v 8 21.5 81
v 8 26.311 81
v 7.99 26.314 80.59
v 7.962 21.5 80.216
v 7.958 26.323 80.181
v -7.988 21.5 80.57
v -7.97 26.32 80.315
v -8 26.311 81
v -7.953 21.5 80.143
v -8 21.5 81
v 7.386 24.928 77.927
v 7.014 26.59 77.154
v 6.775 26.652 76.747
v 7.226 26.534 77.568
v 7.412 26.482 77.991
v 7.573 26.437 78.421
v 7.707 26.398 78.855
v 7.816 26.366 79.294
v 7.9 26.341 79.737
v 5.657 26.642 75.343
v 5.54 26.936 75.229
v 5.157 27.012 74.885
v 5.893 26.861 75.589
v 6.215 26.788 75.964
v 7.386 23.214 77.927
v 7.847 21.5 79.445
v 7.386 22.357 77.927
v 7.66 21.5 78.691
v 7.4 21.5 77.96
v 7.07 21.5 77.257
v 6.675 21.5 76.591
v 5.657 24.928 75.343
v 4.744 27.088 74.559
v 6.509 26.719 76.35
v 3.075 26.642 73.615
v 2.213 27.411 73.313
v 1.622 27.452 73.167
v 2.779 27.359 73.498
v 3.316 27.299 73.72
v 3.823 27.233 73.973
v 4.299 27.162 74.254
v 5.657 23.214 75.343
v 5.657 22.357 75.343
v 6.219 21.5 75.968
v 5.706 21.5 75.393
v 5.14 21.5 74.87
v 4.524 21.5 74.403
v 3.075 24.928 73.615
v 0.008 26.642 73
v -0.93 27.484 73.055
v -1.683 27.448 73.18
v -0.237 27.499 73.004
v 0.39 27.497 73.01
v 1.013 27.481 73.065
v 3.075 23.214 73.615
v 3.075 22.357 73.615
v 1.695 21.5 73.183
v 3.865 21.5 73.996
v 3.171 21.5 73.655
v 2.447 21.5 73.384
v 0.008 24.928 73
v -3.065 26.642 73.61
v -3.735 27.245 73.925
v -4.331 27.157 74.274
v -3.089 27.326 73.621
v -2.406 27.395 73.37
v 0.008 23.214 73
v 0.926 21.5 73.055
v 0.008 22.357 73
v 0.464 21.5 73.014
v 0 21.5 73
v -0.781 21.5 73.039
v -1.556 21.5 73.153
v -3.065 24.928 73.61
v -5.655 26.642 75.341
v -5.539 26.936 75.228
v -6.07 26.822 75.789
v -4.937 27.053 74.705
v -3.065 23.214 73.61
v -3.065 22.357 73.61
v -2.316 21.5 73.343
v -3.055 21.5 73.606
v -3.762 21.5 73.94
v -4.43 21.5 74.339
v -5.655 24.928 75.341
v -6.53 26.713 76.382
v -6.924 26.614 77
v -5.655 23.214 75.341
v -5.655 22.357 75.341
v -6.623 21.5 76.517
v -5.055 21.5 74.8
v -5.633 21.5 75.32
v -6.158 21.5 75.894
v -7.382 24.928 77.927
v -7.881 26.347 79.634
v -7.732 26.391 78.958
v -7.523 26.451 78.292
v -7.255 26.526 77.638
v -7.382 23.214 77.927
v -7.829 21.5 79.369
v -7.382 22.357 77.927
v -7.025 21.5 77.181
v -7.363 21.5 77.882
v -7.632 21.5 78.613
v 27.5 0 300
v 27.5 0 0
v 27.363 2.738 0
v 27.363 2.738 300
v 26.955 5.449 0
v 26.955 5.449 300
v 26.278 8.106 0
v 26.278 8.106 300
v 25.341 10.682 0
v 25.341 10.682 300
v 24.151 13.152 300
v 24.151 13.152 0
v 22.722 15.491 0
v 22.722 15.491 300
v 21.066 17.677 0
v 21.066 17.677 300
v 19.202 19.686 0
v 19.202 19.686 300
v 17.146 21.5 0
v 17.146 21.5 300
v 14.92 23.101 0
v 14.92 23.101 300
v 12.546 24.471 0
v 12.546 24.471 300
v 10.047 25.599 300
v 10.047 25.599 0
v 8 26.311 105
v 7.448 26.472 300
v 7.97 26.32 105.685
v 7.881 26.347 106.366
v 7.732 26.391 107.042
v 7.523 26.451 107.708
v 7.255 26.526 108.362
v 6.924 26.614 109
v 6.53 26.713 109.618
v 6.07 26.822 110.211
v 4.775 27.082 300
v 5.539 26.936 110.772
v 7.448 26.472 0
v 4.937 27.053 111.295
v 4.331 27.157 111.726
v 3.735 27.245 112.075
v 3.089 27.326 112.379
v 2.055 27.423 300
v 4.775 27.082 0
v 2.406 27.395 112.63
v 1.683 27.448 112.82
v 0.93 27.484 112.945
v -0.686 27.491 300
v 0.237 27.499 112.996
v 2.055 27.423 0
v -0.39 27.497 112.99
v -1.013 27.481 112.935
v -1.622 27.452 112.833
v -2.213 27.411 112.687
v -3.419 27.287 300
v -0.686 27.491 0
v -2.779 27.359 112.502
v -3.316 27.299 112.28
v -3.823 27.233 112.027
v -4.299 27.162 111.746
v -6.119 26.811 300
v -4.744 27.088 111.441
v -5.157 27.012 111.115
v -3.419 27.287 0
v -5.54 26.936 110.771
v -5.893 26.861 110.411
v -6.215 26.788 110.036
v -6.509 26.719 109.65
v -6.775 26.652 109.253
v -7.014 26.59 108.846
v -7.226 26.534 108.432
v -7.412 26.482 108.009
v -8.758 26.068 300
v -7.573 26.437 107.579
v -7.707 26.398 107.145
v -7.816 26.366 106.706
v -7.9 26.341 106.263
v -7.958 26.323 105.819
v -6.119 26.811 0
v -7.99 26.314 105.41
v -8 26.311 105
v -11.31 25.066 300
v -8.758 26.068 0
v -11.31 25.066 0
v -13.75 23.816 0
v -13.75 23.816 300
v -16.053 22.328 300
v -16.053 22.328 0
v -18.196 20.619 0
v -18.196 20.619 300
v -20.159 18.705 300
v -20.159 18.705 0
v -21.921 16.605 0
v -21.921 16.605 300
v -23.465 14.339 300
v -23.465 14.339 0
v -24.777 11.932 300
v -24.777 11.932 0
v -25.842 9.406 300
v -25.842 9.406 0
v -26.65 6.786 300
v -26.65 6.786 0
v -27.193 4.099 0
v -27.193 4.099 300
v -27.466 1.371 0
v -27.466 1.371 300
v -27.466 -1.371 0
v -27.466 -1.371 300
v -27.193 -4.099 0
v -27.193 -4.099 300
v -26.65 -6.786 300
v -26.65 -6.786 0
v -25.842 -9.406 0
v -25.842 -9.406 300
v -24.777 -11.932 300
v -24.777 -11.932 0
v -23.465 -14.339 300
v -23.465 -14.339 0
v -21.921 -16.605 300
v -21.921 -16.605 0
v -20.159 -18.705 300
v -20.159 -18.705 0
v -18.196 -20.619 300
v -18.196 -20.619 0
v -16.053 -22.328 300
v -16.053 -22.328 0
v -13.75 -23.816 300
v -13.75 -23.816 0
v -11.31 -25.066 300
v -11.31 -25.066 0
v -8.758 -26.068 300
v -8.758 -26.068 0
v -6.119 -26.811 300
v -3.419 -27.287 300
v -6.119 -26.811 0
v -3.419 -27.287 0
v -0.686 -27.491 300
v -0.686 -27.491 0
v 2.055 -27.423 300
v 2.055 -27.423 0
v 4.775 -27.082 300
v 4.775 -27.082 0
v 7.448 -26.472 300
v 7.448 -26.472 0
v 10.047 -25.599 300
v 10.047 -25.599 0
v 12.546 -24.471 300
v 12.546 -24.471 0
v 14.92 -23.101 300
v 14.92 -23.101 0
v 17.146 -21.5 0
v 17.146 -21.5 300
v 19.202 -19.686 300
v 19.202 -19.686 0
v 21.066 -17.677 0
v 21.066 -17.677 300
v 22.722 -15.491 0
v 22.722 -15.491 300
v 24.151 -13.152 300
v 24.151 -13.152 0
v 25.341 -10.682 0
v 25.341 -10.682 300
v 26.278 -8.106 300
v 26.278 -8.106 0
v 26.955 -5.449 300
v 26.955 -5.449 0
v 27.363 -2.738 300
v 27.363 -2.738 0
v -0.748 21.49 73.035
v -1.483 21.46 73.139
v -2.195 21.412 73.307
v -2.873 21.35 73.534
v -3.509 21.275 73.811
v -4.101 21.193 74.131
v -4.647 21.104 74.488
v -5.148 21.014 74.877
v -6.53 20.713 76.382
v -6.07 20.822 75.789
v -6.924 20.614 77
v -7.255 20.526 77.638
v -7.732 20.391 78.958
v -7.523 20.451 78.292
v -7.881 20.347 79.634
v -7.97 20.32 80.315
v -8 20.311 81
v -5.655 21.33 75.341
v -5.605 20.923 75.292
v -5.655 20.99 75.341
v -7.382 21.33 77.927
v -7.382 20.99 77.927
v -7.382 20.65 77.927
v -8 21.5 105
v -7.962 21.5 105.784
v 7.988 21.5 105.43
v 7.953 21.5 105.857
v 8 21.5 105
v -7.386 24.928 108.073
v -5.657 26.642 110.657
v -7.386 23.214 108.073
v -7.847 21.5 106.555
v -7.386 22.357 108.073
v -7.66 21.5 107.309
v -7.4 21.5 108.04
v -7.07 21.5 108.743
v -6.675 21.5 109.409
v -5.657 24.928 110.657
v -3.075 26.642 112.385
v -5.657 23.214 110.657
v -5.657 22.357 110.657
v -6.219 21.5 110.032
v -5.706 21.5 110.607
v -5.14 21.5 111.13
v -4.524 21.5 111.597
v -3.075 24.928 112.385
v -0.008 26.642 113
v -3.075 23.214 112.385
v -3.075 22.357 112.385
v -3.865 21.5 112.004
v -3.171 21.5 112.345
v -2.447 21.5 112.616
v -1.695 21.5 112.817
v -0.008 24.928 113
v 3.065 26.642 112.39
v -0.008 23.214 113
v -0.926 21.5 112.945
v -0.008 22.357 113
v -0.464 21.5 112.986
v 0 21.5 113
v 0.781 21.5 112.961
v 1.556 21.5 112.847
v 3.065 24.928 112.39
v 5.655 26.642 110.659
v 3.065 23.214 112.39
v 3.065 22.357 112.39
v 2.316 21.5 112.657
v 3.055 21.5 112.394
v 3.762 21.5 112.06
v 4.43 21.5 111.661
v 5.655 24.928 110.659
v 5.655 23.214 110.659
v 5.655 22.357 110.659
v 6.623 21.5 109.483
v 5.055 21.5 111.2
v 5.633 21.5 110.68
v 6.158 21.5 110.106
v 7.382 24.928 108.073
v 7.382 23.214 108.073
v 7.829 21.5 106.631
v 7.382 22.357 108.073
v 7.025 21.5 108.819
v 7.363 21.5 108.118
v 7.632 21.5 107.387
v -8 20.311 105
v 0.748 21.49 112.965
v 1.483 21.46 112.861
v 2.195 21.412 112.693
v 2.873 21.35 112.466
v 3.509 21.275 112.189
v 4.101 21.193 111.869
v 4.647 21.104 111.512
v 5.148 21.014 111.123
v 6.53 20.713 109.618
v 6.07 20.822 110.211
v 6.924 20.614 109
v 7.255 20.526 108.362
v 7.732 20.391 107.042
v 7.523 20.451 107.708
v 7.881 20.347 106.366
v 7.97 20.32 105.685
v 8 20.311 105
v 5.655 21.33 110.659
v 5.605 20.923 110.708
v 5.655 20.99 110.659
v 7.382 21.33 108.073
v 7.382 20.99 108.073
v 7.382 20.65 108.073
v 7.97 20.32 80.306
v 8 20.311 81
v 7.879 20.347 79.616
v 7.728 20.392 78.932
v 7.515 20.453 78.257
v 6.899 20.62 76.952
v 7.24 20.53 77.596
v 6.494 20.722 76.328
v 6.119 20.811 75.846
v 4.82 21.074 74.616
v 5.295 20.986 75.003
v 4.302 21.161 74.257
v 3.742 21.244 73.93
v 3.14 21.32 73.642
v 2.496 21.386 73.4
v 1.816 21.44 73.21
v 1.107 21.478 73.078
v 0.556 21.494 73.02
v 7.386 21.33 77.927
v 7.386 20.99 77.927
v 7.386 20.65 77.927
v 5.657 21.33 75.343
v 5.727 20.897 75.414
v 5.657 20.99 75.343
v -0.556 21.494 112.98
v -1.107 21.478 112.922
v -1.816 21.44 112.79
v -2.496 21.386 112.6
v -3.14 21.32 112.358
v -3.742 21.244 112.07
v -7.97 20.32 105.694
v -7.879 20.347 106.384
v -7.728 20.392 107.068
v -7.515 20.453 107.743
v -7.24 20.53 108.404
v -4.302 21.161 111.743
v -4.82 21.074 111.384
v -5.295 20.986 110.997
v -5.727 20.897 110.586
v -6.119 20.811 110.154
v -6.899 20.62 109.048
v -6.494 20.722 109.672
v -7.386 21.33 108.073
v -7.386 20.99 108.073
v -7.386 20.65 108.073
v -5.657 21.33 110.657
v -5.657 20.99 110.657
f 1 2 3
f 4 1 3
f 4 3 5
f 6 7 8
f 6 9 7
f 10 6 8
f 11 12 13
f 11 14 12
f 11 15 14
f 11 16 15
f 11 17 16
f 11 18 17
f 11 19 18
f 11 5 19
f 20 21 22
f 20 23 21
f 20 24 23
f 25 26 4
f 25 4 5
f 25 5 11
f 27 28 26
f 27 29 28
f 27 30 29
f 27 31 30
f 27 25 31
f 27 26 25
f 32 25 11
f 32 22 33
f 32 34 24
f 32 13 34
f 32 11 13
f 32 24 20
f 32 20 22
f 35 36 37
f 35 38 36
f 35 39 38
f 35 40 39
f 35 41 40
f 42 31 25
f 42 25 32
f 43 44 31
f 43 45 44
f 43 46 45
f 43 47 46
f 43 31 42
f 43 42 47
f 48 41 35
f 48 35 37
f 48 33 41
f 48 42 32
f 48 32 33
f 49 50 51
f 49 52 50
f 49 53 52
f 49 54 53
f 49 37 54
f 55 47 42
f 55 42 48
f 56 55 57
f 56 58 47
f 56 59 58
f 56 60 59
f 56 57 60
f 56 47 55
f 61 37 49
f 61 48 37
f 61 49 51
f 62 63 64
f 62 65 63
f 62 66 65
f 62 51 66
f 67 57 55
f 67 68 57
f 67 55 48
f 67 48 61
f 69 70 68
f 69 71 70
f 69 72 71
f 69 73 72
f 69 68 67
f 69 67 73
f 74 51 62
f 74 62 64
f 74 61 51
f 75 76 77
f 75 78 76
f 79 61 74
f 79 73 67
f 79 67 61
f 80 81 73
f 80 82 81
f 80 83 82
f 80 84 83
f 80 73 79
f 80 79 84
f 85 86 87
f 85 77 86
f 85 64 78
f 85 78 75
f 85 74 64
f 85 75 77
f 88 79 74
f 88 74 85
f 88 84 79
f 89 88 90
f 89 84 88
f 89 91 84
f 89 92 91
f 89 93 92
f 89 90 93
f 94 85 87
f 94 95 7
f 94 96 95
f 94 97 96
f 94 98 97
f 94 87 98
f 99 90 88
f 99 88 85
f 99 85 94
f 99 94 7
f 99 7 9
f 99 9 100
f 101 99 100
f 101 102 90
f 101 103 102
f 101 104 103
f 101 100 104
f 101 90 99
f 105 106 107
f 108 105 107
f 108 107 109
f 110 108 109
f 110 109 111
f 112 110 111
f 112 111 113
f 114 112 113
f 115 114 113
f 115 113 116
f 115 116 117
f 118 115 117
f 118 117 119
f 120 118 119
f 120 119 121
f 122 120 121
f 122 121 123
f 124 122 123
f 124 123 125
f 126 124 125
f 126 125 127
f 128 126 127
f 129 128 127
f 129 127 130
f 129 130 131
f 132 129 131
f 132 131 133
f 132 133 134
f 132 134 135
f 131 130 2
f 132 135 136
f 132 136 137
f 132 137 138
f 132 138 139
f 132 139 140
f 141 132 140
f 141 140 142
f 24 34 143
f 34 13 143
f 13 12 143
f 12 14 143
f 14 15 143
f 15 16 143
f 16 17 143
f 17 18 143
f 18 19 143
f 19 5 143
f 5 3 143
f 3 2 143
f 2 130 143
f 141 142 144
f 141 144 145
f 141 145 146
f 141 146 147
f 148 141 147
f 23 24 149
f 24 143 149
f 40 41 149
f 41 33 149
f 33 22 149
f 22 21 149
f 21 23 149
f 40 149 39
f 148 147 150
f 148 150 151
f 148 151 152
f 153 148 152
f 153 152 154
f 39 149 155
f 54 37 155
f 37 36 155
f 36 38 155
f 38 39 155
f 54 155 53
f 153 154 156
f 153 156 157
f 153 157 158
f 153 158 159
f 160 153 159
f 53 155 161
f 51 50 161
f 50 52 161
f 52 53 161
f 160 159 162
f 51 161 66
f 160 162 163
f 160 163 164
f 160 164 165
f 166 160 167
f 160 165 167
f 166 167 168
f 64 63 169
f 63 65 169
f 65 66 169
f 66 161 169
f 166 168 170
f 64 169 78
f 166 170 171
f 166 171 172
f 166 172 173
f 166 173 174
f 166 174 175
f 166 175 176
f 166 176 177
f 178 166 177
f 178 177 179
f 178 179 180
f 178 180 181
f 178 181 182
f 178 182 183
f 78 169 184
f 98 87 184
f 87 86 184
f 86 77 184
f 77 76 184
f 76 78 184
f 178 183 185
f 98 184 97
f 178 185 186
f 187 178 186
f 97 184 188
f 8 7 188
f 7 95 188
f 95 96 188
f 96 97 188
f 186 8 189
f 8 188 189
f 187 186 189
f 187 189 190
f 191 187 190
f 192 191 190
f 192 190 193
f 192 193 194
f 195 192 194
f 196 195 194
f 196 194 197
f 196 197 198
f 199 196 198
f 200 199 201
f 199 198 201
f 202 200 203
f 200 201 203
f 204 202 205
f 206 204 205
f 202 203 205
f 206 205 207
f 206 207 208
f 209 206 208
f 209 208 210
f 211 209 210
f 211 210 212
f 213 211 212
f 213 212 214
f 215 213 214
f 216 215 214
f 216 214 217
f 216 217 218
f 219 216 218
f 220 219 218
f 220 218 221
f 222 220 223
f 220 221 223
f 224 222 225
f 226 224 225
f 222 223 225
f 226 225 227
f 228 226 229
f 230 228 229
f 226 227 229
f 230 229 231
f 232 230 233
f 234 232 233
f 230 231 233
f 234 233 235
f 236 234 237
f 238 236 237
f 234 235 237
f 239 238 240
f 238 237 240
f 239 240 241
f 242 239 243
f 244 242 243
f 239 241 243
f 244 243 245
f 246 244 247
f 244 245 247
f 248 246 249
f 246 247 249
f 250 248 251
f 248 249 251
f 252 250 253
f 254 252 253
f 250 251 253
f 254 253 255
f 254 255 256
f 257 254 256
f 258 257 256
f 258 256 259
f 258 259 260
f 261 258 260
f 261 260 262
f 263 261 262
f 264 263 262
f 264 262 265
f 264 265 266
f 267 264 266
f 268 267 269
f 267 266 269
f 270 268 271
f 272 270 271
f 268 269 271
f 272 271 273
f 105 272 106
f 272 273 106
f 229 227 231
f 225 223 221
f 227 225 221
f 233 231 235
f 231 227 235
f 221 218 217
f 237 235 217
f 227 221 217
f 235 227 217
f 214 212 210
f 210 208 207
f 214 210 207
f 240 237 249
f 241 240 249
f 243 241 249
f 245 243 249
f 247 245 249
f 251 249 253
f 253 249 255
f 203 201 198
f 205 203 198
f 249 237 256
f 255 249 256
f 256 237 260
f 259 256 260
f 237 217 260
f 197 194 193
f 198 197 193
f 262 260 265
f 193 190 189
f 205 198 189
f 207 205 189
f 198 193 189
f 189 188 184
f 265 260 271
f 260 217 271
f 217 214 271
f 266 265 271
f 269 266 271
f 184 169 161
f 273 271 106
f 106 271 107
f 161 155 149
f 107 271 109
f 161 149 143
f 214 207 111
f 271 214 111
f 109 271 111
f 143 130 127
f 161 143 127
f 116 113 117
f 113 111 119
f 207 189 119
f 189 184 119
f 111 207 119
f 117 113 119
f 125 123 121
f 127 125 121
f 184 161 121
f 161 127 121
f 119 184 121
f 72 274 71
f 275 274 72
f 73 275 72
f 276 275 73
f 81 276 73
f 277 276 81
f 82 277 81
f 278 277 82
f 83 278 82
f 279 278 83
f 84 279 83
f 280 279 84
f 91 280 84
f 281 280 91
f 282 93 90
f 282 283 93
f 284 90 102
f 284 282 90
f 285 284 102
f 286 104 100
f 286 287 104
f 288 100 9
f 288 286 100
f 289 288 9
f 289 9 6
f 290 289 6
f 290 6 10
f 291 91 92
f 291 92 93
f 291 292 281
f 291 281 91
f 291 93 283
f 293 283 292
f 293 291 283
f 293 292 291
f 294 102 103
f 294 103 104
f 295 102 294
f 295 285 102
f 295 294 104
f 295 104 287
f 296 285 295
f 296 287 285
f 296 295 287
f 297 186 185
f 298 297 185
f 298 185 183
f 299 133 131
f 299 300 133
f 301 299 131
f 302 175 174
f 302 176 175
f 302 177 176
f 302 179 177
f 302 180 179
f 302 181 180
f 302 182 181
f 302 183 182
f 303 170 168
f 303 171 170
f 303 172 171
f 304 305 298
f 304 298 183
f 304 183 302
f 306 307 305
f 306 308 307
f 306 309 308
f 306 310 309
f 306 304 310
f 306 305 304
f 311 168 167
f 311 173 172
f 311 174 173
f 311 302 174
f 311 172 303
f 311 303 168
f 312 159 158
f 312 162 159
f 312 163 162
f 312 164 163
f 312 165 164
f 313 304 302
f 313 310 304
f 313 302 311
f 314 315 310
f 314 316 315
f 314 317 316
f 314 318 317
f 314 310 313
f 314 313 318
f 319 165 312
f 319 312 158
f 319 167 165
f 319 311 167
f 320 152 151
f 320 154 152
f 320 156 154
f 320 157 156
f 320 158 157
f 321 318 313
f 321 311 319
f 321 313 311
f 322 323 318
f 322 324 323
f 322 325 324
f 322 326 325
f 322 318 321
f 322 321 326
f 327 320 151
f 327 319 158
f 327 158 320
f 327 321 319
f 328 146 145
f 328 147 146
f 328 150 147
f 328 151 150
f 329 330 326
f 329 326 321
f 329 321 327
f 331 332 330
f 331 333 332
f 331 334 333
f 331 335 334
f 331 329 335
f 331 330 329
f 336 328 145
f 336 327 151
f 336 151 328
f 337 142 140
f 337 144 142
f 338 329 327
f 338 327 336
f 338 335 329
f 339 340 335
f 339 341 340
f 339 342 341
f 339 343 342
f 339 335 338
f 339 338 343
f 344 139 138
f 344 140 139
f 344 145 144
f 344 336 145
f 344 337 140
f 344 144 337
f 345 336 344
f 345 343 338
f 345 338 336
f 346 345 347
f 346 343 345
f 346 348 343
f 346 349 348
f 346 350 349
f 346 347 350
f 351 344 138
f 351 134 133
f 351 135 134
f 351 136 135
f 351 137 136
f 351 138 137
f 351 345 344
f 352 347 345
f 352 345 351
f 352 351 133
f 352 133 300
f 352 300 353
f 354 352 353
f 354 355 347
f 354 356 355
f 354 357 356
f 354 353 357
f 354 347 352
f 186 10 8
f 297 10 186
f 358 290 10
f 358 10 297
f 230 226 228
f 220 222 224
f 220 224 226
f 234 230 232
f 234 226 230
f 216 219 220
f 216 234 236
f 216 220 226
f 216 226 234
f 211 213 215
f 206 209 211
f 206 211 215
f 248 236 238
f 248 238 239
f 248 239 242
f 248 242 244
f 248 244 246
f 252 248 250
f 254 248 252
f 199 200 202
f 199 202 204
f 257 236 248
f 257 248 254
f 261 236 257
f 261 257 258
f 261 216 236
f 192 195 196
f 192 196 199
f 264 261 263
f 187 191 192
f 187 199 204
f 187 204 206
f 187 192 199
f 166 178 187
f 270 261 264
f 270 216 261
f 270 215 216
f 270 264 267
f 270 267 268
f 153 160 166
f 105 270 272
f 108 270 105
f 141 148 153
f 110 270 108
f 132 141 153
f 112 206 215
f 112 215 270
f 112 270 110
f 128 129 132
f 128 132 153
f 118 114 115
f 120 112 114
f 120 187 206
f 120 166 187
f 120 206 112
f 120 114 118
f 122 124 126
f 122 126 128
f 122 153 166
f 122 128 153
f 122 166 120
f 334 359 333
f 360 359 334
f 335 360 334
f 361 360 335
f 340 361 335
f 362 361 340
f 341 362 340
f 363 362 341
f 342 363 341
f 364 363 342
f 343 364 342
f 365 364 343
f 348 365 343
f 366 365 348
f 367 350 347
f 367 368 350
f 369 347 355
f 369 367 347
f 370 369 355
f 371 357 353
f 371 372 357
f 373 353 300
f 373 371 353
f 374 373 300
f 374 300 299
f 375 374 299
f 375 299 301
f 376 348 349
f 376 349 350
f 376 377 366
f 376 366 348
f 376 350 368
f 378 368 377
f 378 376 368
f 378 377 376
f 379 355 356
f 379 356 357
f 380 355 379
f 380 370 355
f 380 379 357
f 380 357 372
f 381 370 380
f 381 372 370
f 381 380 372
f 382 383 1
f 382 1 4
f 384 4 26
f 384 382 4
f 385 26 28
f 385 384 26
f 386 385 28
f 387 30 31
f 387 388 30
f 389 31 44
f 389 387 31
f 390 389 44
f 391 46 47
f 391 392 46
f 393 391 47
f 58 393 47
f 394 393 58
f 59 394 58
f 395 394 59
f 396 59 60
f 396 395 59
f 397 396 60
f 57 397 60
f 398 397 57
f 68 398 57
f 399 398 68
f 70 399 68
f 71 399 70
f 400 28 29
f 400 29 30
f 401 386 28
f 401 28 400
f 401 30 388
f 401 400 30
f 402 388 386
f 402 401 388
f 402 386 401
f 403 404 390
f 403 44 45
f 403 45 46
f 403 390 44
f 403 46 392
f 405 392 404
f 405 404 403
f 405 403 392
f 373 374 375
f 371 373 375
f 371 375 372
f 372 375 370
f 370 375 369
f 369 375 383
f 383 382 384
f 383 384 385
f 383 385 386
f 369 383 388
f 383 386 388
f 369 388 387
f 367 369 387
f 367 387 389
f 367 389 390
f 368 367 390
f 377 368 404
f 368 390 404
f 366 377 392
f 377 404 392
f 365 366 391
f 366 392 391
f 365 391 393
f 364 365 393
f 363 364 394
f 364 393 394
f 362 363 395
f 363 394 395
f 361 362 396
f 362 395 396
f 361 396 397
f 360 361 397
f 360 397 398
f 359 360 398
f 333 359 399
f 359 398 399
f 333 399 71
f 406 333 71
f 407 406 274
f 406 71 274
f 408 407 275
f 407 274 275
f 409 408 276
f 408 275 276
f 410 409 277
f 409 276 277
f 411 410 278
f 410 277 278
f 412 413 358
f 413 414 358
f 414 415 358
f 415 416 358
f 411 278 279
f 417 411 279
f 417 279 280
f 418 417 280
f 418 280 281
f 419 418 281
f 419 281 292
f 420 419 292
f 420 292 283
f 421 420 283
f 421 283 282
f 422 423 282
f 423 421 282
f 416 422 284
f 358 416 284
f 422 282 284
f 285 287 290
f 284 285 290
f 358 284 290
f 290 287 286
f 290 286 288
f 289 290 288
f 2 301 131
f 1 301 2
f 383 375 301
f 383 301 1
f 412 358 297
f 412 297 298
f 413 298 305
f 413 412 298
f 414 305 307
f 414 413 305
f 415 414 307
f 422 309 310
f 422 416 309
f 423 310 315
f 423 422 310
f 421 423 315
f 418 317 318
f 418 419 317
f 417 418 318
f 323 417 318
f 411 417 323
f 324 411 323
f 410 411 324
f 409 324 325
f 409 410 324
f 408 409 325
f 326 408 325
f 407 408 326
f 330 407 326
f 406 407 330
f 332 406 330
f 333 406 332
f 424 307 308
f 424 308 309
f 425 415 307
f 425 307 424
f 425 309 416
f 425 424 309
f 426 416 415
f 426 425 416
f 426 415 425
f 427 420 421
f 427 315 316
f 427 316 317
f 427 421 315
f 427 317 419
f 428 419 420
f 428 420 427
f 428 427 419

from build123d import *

# Parameters (mm, degrees)
SKETCH1_R            = 27.5
BOSS_EXTRUDE1_DEPTH  = 300
CUT_EXTRUDE1_START   = 21.500000052
CUT_EXTRUDE1_DEPTH   = 7.499999948
CUT_EXTRUDE1_START_2 = 20.310644134
CUT_EXTRUDE1_2_DEPTH = 1.189355918
CUT_EXTRUDE1_START_3 = 72.999999946
CUT_EXTRUDE1_3_DEPTH = 40.000000108


with BuildPart() as part:
    # Sketch1 → Boss-Extrude1 (new body)
    with BuildSketch(Plane.XY):
        Circle(SKETCH1_R)
    extrude(amount=BOSS_EXTRUDE1_DEPTH)

    # Cut-Extrude1: read off the stored shape, not the designer's step
    # Cut-Extrude1 outline → Cut-Extrude1 (cut)
    with BuildSketch(Plane(origin=(0, 0, 0), x_dir=(1, 0, 0), z_dir=(0, 1, 0)).offset(CUT_EXTRUDE1_START)):
        with BuildLine():
            Line((-8, -81), (-8, -105))
            add(Edge.make_bspline(
                [(-8, -105), (-8, -106.063035006), (-7.788701178, -107.105523906), (-6.984119374, -109.039699683), (-6.390533847, -109.923095258), (-4.923786882, -111.390000979), (-4.036294094, -111.985161837), (-2.113824822, -112.785621396), (-1.057490709, -112.998980405), (1.04200741, -113.001012103), (2.09275073, -112.792846435), (4.037391687, -111.986238583), (4.915900837, -111.397309074), (7.133041074, -109.181662675), (8, -107.126189888), (8, -105)],
                knots=[0, 0, 0, 0, 0.125, 0.125, 0.25, 0.25, 0.375, 0.375, 0.5, 0.5, 0.625, 0.625, 0.75, 0.75, 1, 1, 1, 1], degree=3))
            Line((8, -105), (8, -81))
            add(Edge.make_bspline(
                [(8, -81), (8, -79.936964994), (7.788701178, -78.894476094), (6.984119374, -76.960300317), (6.390533847, -76.076904742), (4.923786882, -74.609999021), (4.036294094, -74.014838163), (2.113824822, -73.214378604), (1.057490709, -73.001019595), (-1.04200741, -72.998987897), (-2.09275073, -73.207153565), (-4.037391687, -74.013761417), (-4.915900837, -74.602690926), (-7.133041074, -76.818337325), (-8, -78.873810112), (-8, -81)],
                knots=[0, 0, 0, 0, 0.125, 0.125, 0.25, 0.25, 0.375, 0.375, 0.5, 0.5, 0.625, 0.625, 0.75, 0.75, 1, 1, 1, 1], degree=3))
        make_face()
    extrude(amount=CUT_EXTRUDE1_DEPTH, mode=Mode.SUBTRACT)

    # Cut-Extrude1 2 outline → Cut-Extrude1 2 (cut)
    with BuildSketch(Plane(origin=(0, 0, 0), x_dir=(1, 0, 0), z_dir=(0, 1, 0)).offset(CUT_EXTRUDE1_START_2)):
        with BuildLine():
            Line((-8, -81), (-8, -105))
            add(Edge.make_bspline(
                [(-8, -105), (-8, -106.063035006), (-7.788701178, -107.105523906), (-6.984119374, -109.039699683), (-6.390533847, -109.923095258), (-4.923786882, -111.390000979), (-4.036294094, -111.985161837), (-2.113824822, -112.785621396), (-1.057490709, -112.998980405), (1.04200741, -113.001012103), (2.09275073, -112.792846435), (4.037391687, -111.986238583), (4.915900837, -111.397309074), (7.133041074, -109.181662675), (8, -107.126189888), (8, -105)],
                knots=[0, 0, 0, 0, 0.125, 0.125, 0.25, 0.25, 0.375, 0.375, 0.5, 0.5, 0.625, 0.625, 0.75, 0.75, 1, 1, 1, 1], degree=3))
            Line((8, -105), (8, -81))
            add(Edge.make_bspline(
                [(8, -81), (8, -79.936964994), (7.788701178, -78.894476094), (6.984119374, -76.960300317), (6.390533847, -76.076904742), (4.923786882, -74.609999021), (4.036294094, -74.014838163), (2.113824822, -73.214378604), (1.057490709, -73.001019595), (-1.04200741, -72.998987897), (-2.09275073, -73.207153565), (-4.037391687, -74.013761417), (-4.915900837, -74.602690926), (-7.133041074, -76.818337325), (-8, -78.873810112), (-8, -81)],
                knots=[0, 0, 0, 0, 0.125, 0.125, 0.25, 0.25, 0.375, 0.375, 0.5, 0.5, 0.625, 0.625, 0.75, 0.75, 1, 1, 1, 1], degree=3))
        make_face()
    extrude(amount=CUT_EXTRUDE1_2_DEPTH, mode=Mode.SUBTRACT)

    # Cut-Extrude1 3 outline → Cut-Extrude1 3 (add)
    with BuildSketch(Plane.XY.offset(CUT_EXTRUDE1_START_3)):
        with BuildLine():
            ThreePointArc((8, 20.310644234), (0, 21.5), (-8, 20.310644234))
            Line((-8, 20.310644234), (8, 20.310644234))
        make_face()
    extrude(amount=CUT_EXTRUDE1_3_DEPTH)


solid = part.part
